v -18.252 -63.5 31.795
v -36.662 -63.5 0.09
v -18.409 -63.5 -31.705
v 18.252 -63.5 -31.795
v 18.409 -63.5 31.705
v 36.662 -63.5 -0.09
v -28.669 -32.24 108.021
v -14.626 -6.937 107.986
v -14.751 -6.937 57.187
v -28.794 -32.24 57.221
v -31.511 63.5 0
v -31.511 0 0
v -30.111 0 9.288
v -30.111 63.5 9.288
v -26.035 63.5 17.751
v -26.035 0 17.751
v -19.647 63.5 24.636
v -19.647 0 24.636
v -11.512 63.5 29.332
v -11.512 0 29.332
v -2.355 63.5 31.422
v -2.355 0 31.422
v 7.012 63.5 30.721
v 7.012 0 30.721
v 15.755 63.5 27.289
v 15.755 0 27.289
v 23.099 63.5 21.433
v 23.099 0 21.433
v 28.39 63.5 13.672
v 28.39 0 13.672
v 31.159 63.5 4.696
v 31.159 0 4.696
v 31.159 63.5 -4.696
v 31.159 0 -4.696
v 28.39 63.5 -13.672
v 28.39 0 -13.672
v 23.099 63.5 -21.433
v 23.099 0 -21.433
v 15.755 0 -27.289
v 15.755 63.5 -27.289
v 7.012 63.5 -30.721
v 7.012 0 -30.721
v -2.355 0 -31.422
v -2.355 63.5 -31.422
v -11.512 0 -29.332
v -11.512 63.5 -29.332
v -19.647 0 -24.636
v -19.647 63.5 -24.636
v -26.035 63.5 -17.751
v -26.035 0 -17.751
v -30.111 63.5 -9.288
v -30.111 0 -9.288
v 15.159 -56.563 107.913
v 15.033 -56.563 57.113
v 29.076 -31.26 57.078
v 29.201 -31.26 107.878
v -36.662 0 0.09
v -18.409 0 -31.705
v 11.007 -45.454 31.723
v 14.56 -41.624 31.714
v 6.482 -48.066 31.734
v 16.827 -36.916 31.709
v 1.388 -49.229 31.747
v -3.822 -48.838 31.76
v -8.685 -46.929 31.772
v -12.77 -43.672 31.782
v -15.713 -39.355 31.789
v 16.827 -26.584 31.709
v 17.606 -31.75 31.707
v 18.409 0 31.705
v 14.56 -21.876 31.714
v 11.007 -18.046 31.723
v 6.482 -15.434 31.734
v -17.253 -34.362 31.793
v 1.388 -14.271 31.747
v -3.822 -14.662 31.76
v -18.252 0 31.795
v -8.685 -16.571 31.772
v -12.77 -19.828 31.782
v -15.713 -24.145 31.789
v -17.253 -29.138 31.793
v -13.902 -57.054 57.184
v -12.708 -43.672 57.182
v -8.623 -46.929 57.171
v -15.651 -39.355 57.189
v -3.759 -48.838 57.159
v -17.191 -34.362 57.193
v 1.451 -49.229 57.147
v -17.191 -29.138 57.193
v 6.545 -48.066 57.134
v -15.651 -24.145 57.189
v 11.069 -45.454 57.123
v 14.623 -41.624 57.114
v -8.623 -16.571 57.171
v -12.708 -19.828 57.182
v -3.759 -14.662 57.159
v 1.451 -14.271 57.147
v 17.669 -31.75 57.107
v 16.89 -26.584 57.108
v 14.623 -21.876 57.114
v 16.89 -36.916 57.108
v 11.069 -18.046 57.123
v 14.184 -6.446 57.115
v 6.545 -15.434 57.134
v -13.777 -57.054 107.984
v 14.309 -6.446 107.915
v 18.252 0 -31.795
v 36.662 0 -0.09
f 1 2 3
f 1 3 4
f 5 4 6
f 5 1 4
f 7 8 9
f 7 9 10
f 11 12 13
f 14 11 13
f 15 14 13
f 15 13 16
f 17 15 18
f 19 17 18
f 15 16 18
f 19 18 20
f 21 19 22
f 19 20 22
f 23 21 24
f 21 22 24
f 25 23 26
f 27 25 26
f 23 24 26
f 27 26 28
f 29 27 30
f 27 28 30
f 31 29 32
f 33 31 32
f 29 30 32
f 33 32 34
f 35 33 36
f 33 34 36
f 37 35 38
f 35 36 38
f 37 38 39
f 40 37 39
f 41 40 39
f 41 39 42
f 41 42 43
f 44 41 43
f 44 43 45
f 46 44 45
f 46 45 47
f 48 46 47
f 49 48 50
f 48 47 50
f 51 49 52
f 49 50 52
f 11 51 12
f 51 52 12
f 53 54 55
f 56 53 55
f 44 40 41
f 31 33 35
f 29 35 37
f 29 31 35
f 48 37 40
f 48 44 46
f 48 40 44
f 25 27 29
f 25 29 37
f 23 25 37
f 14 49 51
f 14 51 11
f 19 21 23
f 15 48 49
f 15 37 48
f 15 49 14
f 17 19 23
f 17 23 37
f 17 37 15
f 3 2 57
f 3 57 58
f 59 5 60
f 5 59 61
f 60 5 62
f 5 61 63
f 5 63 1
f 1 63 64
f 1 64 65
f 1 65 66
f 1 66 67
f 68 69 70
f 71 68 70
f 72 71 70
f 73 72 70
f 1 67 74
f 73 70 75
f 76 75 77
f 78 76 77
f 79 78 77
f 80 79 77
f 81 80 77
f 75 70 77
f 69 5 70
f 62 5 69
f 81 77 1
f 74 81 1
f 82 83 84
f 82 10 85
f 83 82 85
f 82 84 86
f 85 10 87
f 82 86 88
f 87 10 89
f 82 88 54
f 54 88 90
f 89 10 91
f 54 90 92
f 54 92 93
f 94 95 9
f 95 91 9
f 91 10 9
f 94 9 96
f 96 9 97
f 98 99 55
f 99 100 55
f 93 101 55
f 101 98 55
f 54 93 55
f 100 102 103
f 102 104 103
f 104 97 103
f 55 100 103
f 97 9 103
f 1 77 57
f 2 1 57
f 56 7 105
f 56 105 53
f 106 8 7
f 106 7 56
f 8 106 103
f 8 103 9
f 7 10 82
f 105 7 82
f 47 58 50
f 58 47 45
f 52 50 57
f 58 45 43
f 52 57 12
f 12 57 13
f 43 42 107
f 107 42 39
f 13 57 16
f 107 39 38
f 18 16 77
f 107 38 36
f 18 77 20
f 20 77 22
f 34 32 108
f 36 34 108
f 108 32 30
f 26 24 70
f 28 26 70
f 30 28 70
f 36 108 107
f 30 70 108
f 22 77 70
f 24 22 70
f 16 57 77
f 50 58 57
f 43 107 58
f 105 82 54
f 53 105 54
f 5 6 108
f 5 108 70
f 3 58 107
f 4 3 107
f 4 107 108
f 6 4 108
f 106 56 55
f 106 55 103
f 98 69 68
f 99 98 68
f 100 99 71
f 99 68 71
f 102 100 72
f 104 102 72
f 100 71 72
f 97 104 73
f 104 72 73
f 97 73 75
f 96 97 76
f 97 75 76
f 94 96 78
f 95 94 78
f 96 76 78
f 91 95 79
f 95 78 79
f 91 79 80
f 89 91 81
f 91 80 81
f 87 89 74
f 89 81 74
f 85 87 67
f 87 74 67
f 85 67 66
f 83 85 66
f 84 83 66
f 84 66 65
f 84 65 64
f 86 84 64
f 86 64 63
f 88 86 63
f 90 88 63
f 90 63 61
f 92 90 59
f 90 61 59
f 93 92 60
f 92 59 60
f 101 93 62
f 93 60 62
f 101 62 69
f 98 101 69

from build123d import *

# Parameters (mm, degrees)
F1_DEPTH = 63.5
F2_R     = 31.5105933146
F3_DEPTH = 63.5
F4_R     = 17.5276637919
F5_DEPTH = 25.4
F7_DEPTH = 50.8


with BuildPart() as f1:
    # F0 (on Front) → F1 (new body)
    with BuildSketch(Plane.XZ):
        Polygon((18.2524688239, -31.795136659), (36.6616304755, -0.0904666463), (18.4091616516, 31.7046700128), (-18.2524688239, 31.795136659), (-36.6616304755, 0.0904666463), (-18.4091616516, -31.7046700128), align=None)
    extrude(amount=F1_DEPTH)

    # F2 (on face) → F3 (join)
    with BuildSketch(Plane(origin=(0, 0, 0), x_dir=(-1, 0, 0), z_dir=(0, 1, 0))):
        Circle(F2_R)
    extrude(amount=F3_DEPTH)

    # F4 (on face) → F5 (join)
    with BuildSketch(Plane(origin=(0.0783464139, 0, 31.7499033359), x_dir=(0.9999969555, 0, -0.0024676036), z_dir=(0.0024676036, 0, 0.9999969555))):
        with Locations((0, -31.75)):
            Circle(F4_R)
    extrude(amount=F5_DEPTH)

    # F6 (on face) → F7 (join)
    with BuildSketch(Plane(origin=(0.141023545, 0, 57.1498260046), x_dir=(0.9999969555, 0, -0.0024676036), z_dir=(0.0024676036, 0, 0.9999969555))):
        Polygon((14.8922465929, -56.5634329038), (28.9351865462, -31.2596525831), (14.0429399534, -6.4462196793), (-14.8922465929, -6.9365670962), (-28.9351865462, -32.2403474169), (-14.0429399534, -57.0537803207), align=None)
    extrude(amount=F7_DEPTH)


solid = f1.part
